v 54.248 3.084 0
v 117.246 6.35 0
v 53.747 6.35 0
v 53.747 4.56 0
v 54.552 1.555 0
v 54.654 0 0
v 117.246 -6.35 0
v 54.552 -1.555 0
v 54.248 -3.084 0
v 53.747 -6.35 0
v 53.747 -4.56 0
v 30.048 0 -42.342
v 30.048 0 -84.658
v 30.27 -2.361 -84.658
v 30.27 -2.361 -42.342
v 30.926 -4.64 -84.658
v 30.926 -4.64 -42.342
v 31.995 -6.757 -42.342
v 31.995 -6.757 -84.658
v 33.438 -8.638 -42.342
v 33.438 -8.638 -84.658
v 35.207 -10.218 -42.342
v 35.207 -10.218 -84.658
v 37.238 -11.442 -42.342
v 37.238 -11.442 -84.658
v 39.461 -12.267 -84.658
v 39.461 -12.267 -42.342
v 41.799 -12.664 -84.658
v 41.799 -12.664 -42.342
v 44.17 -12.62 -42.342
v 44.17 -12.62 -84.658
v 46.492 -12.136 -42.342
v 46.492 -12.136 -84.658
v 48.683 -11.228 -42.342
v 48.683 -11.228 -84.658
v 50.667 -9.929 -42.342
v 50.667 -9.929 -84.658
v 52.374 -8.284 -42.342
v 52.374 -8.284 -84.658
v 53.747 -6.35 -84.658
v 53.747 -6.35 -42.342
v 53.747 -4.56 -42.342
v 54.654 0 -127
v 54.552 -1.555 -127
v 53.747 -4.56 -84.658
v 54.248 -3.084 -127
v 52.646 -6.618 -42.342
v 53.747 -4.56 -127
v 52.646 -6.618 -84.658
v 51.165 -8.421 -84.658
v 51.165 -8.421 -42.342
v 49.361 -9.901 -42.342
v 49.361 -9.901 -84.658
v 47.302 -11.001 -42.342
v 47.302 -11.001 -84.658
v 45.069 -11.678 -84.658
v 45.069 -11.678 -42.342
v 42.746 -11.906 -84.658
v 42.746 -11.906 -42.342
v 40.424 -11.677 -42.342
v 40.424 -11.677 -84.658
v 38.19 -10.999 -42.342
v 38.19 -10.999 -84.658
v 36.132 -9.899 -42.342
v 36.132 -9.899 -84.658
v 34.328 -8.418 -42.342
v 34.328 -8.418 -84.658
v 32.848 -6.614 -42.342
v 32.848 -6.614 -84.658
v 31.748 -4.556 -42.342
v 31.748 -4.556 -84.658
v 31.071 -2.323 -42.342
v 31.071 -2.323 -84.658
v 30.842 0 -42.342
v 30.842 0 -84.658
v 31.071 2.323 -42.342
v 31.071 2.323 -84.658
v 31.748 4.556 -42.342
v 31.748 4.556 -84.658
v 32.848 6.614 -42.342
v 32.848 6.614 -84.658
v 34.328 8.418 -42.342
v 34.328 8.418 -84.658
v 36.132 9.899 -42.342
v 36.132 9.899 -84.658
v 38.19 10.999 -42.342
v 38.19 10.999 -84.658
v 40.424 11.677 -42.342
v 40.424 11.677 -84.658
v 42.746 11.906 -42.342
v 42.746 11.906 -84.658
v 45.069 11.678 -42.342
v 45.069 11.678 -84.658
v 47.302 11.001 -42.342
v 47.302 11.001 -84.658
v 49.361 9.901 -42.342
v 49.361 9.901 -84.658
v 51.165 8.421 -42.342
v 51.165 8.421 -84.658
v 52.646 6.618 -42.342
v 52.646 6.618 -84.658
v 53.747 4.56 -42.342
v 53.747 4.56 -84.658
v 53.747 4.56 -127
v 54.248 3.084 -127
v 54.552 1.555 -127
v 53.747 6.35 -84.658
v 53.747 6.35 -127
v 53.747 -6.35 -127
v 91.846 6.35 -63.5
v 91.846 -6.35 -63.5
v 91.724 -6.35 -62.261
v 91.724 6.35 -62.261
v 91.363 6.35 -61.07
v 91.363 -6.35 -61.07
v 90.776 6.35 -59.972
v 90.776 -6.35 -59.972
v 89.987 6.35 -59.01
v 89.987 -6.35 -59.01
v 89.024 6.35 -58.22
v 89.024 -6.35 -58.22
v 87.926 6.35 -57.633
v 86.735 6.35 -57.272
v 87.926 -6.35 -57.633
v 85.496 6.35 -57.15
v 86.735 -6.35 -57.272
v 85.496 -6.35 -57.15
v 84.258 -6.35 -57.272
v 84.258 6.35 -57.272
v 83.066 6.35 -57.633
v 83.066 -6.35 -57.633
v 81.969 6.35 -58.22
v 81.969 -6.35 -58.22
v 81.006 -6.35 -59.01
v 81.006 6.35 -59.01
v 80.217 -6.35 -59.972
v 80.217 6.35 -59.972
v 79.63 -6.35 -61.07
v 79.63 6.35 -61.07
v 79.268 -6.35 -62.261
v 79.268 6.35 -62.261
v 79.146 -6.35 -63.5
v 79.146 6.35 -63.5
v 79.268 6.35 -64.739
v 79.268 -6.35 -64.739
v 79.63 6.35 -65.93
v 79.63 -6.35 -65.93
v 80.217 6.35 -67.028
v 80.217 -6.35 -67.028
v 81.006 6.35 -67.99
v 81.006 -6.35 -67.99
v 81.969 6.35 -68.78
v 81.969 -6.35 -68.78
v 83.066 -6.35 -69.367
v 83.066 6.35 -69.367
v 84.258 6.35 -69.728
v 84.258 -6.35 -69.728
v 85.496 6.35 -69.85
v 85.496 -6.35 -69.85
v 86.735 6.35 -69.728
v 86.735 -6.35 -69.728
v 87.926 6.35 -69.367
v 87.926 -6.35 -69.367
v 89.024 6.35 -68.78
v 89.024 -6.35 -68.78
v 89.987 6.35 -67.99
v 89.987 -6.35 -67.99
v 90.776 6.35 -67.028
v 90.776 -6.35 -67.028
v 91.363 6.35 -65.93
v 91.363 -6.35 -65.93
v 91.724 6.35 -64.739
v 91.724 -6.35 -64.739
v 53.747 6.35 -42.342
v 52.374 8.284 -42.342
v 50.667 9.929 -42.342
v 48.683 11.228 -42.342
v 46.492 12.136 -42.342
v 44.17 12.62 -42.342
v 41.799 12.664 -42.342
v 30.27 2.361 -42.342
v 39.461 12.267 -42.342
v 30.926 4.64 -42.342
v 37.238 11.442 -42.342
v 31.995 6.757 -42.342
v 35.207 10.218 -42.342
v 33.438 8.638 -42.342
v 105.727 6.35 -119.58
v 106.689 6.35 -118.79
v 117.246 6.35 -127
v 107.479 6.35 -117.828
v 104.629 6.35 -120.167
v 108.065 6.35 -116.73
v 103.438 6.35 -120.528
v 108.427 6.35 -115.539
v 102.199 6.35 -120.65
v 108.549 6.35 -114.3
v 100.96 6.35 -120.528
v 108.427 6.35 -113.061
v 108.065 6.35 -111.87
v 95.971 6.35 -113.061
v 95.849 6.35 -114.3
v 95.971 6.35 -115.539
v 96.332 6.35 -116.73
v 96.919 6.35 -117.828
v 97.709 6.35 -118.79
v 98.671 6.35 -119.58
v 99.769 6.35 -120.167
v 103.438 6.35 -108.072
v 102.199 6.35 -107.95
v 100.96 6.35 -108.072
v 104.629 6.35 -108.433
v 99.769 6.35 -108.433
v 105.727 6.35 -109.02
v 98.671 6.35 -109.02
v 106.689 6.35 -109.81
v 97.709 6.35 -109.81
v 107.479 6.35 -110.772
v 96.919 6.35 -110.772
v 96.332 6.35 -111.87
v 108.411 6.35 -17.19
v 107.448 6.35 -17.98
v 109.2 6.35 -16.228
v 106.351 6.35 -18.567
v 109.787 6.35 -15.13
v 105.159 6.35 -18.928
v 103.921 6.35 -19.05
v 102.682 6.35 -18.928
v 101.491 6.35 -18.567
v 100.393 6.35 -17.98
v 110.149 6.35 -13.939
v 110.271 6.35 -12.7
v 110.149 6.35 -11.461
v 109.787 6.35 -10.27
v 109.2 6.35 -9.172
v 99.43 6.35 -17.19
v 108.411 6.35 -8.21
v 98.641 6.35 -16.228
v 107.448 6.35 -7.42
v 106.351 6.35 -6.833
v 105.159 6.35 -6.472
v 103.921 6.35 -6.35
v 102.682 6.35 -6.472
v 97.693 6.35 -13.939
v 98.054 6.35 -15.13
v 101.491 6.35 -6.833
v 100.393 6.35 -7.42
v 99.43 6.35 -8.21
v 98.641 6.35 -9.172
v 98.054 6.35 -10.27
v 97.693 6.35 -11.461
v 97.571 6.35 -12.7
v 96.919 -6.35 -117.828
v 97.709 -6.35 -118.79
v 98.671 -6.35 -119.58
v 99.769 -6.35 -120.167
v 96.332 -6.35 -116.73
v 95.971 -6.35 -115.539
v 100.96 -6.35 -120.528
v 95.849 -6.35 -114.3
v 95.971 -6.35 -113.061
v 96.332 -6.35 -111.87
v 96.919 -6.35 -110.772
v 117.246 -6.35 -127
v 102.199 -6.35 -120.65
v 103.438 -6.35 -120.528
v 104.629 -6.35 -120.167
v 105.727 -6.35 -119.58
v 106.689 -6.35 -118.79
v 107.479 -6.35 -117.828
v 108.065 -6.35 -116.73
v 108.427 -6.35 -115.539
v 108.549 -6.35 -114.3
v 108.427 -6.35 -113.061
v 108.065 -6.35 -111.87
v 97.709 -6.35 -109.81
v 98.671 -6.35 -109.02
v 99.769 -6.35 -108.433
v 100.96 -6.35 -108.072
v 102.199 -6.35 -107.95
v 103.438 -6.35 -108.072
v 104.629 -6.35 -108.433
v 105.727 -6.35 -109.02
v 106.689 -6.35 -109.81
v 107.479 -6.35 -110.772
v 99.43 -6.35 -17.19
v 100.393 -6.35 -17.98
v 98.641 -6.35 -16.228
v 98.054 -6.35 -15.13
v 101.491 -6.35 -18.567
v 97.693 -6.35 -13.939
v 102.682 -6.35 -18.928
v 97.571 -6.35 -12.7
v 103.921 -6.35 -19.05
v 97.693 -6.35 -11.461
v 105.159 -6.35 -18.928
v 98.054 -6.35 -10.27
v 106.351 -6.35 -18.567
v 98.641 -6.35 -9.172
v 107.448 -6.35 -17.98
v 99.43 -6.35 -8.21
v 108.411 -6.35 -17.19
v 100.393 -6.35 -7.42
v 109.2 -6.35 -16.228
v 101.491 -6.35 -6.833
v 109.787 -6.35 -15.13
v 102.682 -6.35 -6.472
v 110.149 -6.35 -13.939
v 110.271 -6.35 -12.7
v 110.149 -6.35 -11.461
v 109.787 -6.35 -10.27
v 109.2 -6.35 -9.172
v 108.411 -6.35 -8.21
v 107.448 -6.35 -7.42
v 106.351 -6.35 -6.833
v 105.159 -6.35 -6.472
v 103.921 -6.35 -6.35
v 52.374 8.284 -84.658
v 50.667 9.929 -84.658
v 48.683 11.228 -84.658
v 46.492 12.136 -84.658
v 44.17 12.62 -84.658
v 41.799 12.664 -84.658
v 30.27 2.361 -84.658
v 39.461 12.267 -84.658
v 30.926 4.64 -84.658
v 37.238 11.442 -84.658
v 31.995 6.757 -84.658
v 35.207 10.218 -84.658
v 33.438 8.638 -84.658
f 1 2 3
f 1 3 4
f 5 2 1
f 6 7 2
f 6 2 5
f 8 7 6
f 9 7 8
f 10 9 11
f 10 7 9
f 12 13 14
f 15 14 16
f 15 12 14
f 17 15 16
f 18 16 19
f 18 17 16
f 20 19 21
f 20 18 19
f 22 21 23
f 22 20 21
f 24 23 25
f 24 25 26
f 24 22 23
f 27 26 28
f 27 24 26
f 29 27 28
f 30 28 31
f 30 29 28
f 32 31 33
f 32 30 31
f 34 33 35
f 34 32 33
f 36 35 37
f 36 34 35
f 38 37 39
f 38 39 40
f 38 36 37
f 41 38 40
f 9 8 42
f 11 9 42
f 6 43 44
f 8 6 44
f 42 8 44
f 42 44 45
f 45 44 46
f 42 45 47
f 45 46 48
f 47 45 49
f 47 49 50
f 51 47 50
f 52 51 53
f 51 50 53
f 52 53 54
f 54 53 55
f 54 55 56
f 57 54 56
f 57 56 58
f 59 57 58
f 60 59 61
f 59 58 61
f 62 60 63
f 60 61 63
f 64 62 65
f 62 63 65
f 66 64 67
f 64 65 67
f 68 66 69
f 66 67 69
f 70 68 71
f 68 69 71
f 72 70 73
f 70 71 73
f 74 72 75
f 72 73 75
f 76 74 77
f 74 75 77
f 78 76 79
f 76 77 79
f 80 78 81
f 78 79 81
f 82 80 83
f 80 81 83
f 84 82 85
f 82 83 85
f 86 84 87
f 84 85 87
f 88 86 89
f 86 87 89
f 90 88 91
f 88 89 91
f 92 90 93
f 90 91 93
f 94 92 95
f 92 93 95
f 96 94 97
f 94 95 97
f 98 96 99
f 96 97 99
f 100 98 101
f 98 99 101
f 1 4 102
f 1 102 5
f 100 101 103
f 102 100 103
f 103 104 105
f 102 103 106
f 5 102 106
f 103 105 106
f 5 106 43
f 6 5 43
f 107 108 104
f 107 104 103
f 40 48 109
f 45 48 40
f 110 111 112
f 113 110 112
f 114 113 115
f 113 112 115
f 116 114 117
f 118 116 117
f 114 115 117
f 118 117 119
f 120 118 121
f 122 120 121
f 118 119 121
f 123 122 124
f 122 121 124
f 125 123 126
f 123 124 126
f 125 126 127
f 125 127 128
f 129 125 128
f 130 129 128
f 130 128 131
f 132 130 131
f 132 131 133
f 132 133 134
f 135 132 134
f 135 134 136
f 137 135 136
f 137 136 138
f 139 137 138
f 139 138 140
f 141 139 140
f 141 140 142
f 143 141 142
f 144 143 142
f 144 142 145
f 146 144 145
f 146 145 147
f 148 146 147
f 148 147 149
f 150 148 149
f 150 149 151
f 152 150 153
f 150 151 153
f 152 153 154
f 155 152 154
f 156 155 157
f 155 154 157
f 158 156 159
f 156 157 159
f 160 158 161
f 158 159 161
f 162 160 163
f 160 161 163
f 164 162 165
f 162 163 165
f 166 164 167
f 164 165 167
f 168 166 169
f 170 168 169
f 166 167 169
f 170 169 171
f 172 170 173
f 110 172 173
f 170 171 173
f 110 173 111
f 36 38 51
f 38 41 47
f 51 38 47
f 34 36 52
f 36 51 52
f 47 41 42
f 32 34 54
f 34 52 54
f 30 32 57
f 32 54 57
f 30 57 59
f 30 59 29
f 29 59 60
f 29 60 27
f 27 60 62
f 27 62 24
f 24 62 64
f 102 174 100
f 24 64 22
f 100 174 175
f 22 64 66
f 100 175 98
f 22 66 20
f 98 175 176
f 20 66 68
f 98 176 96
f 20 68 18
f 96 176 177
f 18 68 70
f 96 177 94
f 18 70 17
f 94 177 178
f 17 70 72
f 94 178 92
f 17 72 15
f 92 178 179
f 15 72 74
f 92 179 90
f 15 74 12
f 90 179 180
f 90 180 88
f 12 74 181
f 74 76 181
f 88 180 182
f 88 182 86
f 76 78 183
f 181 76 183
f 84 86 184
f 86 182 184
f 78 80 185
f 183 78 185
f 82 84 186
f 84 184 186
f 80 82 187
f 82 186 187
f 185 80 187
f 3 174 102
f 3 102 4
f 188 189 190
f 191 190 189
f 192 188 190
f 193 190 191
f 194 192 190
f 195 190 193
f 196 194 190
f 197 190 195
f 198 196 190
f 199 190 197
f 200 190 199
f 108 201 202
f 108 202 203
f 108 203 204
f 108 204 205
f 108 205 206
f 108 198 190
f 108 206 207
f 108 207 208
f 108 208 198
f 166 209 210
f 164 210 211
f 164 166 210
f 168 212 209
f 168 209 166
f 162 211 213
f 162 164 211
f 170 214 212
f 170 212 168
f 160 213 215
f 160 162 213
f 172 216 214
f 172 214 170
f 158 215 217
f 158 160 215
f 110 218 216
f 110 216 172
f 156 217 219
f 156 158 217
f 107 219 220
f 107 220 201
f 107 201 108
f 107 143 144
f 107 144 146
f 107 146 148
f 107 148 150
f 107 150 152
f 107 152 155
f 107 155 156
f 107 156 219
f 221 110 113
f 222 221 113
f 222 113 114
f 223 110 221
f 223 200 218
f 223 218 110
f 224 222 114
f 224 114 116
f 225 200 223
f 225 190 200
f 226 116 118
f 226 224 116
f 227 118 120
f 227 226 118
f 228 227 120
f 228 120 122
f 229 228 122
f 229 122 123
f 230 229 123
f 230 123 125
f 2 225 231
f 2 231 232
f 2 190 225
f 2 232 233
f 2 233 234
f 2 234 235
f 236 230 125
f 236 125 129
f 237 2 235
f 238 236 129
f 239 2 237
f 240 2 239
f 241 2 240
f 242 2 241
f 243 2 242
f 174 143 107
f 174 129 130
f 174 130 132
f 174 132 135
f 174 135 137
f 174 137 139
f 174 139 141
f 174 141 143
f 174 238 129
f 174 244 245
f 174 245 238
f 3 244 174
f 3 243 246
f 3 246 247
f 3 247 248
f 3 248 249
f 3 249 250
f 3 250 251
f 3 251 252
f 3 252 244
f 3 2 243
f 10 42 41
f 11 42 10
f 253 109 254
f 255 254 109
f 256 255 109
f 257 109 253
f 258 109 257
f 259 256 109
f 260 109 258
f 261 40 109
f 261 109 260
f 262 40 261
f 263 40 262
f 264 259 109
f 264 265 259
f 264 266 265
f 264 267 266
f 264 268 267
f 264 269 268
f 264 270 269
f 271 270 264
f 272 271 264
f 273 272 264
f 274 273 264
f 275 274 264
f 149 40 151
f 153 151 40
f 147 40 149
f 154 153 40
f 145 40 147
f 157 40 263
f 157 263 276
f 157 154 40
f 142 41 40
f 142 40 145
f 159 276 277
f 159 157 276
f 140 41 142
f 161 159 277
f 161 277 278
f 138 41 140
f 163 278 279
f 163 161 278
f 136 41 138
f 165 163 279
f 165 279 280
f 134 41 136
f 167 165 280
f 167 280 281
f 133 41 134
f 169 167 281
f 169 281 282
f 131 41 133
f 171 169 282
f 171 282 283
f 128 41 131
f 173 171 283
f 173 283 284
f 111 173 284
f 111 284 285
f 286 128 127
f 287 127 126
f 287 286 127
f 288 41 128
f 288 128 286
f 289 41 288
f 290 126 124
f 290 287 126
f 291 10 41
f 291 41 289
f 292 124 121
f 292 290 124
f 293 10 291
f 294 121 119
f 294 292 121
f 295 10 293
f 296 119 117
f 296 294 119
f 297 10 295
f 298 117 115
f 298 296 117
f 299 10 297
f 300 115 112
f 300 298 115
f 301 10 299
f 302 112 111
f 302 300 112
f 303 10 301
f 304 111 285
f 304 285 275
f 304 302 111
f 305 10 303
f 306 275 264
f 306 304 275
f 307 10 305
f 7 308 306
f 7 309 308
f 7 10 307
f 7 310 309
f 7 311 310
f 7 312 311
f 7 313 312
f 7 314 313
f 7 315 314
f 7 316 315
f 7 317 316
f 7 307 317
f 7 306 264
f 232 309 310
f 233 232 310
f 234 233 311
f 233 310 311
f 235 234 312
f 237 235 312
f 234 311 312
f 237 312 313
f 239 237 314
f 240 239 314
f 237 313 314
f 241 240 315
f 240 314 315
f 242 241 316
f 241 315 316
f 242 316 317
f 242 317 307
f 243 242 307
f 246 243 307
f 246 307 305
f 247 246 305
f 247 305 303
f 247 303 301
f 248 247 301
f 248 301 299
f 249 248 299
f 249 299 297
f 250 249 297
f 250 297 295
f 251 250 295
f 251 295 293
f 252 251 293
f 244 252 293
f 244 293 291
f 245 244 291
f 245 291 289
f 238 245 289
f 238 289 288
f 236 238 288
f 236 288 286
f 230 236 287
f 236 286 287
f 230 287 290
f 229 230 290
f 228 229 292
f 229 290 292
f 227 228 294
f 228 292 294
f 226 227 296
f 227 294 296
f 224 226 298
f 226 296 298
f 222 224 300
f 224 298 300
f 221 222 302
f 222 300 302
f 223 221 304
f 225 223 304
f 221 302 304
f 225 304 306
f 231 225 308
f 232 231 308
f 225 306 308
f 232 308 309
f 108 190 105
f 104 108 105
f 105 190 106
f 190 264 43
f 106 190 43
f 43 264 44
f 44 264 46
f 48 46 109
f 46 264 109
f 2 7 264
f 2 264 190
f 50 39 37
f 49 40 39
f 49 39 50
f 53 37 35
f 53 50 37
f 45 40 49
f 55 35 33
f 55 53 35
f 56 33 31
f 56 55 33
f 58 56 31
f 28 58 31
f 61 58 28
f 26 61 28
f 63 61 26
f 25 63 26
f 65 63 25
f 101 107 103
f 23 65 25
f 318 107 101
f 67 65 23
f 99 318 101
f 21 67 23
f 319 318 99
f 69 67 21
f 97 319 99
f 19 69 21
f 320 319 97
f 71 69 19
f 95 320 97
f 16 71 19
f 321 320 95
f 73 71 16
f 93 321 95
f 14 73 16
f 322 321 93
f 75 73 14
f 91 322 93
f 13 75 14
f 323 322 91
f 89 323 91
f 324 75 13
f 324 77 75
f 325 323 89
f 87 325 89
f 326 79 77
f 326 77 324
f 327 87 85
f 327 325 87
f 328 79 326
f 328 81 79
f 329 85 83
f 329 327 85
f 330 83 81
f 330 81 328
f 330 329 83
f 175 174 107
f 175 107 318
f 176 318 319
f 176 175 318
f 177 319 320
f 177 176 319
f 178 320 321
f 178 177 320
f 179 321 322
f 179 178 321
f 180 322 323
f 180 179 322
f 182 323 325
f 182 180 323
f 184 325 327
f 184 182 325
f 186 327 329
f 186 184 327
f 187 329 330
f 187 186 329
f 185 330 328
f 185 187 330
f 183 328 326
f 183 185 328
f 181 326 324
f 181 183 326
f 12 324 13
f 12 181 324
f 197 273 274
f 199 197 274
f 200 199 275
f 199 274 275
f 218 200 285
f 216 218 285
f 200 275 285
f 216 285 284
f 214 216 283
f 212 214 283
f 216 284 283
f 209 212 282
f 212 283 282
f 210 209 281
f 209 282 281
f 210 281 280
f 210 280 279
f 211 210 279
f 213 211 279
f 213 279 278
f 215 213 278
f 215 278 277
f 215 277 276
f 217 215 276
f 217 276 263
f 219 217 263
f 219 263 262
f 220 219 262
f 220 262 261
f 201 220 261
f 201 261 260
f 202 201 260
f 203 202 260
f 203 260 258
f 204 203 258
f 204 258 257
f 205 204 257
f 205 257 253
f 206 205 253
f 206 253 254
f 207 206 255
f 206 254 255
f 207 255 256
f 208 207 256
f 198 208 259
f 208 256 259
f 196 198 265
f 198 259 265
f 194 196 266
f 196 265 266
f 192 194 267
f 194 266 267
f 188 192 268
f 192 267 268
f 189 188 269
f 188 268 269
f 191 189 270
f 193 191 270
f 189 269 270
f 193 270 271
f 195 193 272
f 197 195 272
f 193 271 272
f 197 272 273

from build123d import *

# Parameters (mm, degrees)
F1_DEPTH      = 127
F2_W          = 29.5337063888
F2_H          = 42.3418
F3_DEPTH      = 25.4
F3_DEPTH_BACK = 25.4
F5_D          = 12.7
F6_D          = 23.8125
F7_ANGLE      = -180


# Not quite as in the source:
# - a length typed as a fraction of an inch, garbled in the dataset ("3 / 203.2 mm" for 3/8 in), is restored


with BuildPart() as f1:
    # F0 (on Top) → F1 (new body)
    with BuildSketch(Plane.XY):
        with BuildLine():
            Line((31.7496773719, 6.35), (-31.75, 6.35))
            Line((-31.75, 6.35), (-31.75, -6.35))
            Line((-31.75, -6.35), (31.7496773719, -6.35))
            ThreePointArc((31.7496773719, -6.35), (30.0482, 0), (31.7496773719, 6.35))
        make_face()
        with BuildLine():
            ThreePointArc((55.4482, 0), (46.0352018728, 12.2672579939), (31.7496773719, 6.35))
            Line((31.7496773719, 6.35), (31.75, 6.35))
            Line((31.75, 6.35), (31.75, -6.35))
            Line((31.75, -6.35), (31.7496773719, -6.35))
            ThreePointArc((31.7496773719, -6.35), (46.0352018728, -12.2672579939), (55.4482, 0))
        make_face()
        with BuildLine():
            Line((31.75, 6.35), (31.7496773719, 6.35))
            ThreePointArc((31.7496773719, 6.35), (30.0482, 0), (31.7496773719, -6.35))
            Line((31.7496773719, -6.35), (31.75, -6.35))
            Line((31.75, -6.35), (31.75, 6.35))
        make_face()
    extrude(amount=-F1_DEPTH)

    # F2 (on face) → F3 (cut, two sides)
    with BuildSketch(Plane.XZ.offset(6.35)) as f3_sk:
        with Locations((46.5165305664, -21.1709)):
            Rectangle(F2_W, F2_H)
        with Locations((46.5165305664, -105.8291)):
            Rectangle(F2_W, F2_H)
    extrude(amount=F3_DEPTH, mode=Mode.SUBTRACT)
    extrude(f3_sk.sketch, amount=-F3_DEPTH_BACK, mode=Mode.SUBTRACT)

    # F5 (through all)
    with Locations(Plane.XZ.offset(6.35)):
        with Locations((-18.4241778449, -12.7), (-16.7022929663, -114.3), (0, -63.5)):
            Hole(F5_D / 2)

    # F6 (through all)
    with Locations(Plane.XY):
        with Locations((42.7482, 0)):
            Hole(F6_D / 2)


with BuildPart() as f1_1:
    # F7: moved
    add(f1.part.rotate(Axis((42.7482, 0, 0), (0, 0, 1)), F7_ANGLE))


solid = f1_1.part
